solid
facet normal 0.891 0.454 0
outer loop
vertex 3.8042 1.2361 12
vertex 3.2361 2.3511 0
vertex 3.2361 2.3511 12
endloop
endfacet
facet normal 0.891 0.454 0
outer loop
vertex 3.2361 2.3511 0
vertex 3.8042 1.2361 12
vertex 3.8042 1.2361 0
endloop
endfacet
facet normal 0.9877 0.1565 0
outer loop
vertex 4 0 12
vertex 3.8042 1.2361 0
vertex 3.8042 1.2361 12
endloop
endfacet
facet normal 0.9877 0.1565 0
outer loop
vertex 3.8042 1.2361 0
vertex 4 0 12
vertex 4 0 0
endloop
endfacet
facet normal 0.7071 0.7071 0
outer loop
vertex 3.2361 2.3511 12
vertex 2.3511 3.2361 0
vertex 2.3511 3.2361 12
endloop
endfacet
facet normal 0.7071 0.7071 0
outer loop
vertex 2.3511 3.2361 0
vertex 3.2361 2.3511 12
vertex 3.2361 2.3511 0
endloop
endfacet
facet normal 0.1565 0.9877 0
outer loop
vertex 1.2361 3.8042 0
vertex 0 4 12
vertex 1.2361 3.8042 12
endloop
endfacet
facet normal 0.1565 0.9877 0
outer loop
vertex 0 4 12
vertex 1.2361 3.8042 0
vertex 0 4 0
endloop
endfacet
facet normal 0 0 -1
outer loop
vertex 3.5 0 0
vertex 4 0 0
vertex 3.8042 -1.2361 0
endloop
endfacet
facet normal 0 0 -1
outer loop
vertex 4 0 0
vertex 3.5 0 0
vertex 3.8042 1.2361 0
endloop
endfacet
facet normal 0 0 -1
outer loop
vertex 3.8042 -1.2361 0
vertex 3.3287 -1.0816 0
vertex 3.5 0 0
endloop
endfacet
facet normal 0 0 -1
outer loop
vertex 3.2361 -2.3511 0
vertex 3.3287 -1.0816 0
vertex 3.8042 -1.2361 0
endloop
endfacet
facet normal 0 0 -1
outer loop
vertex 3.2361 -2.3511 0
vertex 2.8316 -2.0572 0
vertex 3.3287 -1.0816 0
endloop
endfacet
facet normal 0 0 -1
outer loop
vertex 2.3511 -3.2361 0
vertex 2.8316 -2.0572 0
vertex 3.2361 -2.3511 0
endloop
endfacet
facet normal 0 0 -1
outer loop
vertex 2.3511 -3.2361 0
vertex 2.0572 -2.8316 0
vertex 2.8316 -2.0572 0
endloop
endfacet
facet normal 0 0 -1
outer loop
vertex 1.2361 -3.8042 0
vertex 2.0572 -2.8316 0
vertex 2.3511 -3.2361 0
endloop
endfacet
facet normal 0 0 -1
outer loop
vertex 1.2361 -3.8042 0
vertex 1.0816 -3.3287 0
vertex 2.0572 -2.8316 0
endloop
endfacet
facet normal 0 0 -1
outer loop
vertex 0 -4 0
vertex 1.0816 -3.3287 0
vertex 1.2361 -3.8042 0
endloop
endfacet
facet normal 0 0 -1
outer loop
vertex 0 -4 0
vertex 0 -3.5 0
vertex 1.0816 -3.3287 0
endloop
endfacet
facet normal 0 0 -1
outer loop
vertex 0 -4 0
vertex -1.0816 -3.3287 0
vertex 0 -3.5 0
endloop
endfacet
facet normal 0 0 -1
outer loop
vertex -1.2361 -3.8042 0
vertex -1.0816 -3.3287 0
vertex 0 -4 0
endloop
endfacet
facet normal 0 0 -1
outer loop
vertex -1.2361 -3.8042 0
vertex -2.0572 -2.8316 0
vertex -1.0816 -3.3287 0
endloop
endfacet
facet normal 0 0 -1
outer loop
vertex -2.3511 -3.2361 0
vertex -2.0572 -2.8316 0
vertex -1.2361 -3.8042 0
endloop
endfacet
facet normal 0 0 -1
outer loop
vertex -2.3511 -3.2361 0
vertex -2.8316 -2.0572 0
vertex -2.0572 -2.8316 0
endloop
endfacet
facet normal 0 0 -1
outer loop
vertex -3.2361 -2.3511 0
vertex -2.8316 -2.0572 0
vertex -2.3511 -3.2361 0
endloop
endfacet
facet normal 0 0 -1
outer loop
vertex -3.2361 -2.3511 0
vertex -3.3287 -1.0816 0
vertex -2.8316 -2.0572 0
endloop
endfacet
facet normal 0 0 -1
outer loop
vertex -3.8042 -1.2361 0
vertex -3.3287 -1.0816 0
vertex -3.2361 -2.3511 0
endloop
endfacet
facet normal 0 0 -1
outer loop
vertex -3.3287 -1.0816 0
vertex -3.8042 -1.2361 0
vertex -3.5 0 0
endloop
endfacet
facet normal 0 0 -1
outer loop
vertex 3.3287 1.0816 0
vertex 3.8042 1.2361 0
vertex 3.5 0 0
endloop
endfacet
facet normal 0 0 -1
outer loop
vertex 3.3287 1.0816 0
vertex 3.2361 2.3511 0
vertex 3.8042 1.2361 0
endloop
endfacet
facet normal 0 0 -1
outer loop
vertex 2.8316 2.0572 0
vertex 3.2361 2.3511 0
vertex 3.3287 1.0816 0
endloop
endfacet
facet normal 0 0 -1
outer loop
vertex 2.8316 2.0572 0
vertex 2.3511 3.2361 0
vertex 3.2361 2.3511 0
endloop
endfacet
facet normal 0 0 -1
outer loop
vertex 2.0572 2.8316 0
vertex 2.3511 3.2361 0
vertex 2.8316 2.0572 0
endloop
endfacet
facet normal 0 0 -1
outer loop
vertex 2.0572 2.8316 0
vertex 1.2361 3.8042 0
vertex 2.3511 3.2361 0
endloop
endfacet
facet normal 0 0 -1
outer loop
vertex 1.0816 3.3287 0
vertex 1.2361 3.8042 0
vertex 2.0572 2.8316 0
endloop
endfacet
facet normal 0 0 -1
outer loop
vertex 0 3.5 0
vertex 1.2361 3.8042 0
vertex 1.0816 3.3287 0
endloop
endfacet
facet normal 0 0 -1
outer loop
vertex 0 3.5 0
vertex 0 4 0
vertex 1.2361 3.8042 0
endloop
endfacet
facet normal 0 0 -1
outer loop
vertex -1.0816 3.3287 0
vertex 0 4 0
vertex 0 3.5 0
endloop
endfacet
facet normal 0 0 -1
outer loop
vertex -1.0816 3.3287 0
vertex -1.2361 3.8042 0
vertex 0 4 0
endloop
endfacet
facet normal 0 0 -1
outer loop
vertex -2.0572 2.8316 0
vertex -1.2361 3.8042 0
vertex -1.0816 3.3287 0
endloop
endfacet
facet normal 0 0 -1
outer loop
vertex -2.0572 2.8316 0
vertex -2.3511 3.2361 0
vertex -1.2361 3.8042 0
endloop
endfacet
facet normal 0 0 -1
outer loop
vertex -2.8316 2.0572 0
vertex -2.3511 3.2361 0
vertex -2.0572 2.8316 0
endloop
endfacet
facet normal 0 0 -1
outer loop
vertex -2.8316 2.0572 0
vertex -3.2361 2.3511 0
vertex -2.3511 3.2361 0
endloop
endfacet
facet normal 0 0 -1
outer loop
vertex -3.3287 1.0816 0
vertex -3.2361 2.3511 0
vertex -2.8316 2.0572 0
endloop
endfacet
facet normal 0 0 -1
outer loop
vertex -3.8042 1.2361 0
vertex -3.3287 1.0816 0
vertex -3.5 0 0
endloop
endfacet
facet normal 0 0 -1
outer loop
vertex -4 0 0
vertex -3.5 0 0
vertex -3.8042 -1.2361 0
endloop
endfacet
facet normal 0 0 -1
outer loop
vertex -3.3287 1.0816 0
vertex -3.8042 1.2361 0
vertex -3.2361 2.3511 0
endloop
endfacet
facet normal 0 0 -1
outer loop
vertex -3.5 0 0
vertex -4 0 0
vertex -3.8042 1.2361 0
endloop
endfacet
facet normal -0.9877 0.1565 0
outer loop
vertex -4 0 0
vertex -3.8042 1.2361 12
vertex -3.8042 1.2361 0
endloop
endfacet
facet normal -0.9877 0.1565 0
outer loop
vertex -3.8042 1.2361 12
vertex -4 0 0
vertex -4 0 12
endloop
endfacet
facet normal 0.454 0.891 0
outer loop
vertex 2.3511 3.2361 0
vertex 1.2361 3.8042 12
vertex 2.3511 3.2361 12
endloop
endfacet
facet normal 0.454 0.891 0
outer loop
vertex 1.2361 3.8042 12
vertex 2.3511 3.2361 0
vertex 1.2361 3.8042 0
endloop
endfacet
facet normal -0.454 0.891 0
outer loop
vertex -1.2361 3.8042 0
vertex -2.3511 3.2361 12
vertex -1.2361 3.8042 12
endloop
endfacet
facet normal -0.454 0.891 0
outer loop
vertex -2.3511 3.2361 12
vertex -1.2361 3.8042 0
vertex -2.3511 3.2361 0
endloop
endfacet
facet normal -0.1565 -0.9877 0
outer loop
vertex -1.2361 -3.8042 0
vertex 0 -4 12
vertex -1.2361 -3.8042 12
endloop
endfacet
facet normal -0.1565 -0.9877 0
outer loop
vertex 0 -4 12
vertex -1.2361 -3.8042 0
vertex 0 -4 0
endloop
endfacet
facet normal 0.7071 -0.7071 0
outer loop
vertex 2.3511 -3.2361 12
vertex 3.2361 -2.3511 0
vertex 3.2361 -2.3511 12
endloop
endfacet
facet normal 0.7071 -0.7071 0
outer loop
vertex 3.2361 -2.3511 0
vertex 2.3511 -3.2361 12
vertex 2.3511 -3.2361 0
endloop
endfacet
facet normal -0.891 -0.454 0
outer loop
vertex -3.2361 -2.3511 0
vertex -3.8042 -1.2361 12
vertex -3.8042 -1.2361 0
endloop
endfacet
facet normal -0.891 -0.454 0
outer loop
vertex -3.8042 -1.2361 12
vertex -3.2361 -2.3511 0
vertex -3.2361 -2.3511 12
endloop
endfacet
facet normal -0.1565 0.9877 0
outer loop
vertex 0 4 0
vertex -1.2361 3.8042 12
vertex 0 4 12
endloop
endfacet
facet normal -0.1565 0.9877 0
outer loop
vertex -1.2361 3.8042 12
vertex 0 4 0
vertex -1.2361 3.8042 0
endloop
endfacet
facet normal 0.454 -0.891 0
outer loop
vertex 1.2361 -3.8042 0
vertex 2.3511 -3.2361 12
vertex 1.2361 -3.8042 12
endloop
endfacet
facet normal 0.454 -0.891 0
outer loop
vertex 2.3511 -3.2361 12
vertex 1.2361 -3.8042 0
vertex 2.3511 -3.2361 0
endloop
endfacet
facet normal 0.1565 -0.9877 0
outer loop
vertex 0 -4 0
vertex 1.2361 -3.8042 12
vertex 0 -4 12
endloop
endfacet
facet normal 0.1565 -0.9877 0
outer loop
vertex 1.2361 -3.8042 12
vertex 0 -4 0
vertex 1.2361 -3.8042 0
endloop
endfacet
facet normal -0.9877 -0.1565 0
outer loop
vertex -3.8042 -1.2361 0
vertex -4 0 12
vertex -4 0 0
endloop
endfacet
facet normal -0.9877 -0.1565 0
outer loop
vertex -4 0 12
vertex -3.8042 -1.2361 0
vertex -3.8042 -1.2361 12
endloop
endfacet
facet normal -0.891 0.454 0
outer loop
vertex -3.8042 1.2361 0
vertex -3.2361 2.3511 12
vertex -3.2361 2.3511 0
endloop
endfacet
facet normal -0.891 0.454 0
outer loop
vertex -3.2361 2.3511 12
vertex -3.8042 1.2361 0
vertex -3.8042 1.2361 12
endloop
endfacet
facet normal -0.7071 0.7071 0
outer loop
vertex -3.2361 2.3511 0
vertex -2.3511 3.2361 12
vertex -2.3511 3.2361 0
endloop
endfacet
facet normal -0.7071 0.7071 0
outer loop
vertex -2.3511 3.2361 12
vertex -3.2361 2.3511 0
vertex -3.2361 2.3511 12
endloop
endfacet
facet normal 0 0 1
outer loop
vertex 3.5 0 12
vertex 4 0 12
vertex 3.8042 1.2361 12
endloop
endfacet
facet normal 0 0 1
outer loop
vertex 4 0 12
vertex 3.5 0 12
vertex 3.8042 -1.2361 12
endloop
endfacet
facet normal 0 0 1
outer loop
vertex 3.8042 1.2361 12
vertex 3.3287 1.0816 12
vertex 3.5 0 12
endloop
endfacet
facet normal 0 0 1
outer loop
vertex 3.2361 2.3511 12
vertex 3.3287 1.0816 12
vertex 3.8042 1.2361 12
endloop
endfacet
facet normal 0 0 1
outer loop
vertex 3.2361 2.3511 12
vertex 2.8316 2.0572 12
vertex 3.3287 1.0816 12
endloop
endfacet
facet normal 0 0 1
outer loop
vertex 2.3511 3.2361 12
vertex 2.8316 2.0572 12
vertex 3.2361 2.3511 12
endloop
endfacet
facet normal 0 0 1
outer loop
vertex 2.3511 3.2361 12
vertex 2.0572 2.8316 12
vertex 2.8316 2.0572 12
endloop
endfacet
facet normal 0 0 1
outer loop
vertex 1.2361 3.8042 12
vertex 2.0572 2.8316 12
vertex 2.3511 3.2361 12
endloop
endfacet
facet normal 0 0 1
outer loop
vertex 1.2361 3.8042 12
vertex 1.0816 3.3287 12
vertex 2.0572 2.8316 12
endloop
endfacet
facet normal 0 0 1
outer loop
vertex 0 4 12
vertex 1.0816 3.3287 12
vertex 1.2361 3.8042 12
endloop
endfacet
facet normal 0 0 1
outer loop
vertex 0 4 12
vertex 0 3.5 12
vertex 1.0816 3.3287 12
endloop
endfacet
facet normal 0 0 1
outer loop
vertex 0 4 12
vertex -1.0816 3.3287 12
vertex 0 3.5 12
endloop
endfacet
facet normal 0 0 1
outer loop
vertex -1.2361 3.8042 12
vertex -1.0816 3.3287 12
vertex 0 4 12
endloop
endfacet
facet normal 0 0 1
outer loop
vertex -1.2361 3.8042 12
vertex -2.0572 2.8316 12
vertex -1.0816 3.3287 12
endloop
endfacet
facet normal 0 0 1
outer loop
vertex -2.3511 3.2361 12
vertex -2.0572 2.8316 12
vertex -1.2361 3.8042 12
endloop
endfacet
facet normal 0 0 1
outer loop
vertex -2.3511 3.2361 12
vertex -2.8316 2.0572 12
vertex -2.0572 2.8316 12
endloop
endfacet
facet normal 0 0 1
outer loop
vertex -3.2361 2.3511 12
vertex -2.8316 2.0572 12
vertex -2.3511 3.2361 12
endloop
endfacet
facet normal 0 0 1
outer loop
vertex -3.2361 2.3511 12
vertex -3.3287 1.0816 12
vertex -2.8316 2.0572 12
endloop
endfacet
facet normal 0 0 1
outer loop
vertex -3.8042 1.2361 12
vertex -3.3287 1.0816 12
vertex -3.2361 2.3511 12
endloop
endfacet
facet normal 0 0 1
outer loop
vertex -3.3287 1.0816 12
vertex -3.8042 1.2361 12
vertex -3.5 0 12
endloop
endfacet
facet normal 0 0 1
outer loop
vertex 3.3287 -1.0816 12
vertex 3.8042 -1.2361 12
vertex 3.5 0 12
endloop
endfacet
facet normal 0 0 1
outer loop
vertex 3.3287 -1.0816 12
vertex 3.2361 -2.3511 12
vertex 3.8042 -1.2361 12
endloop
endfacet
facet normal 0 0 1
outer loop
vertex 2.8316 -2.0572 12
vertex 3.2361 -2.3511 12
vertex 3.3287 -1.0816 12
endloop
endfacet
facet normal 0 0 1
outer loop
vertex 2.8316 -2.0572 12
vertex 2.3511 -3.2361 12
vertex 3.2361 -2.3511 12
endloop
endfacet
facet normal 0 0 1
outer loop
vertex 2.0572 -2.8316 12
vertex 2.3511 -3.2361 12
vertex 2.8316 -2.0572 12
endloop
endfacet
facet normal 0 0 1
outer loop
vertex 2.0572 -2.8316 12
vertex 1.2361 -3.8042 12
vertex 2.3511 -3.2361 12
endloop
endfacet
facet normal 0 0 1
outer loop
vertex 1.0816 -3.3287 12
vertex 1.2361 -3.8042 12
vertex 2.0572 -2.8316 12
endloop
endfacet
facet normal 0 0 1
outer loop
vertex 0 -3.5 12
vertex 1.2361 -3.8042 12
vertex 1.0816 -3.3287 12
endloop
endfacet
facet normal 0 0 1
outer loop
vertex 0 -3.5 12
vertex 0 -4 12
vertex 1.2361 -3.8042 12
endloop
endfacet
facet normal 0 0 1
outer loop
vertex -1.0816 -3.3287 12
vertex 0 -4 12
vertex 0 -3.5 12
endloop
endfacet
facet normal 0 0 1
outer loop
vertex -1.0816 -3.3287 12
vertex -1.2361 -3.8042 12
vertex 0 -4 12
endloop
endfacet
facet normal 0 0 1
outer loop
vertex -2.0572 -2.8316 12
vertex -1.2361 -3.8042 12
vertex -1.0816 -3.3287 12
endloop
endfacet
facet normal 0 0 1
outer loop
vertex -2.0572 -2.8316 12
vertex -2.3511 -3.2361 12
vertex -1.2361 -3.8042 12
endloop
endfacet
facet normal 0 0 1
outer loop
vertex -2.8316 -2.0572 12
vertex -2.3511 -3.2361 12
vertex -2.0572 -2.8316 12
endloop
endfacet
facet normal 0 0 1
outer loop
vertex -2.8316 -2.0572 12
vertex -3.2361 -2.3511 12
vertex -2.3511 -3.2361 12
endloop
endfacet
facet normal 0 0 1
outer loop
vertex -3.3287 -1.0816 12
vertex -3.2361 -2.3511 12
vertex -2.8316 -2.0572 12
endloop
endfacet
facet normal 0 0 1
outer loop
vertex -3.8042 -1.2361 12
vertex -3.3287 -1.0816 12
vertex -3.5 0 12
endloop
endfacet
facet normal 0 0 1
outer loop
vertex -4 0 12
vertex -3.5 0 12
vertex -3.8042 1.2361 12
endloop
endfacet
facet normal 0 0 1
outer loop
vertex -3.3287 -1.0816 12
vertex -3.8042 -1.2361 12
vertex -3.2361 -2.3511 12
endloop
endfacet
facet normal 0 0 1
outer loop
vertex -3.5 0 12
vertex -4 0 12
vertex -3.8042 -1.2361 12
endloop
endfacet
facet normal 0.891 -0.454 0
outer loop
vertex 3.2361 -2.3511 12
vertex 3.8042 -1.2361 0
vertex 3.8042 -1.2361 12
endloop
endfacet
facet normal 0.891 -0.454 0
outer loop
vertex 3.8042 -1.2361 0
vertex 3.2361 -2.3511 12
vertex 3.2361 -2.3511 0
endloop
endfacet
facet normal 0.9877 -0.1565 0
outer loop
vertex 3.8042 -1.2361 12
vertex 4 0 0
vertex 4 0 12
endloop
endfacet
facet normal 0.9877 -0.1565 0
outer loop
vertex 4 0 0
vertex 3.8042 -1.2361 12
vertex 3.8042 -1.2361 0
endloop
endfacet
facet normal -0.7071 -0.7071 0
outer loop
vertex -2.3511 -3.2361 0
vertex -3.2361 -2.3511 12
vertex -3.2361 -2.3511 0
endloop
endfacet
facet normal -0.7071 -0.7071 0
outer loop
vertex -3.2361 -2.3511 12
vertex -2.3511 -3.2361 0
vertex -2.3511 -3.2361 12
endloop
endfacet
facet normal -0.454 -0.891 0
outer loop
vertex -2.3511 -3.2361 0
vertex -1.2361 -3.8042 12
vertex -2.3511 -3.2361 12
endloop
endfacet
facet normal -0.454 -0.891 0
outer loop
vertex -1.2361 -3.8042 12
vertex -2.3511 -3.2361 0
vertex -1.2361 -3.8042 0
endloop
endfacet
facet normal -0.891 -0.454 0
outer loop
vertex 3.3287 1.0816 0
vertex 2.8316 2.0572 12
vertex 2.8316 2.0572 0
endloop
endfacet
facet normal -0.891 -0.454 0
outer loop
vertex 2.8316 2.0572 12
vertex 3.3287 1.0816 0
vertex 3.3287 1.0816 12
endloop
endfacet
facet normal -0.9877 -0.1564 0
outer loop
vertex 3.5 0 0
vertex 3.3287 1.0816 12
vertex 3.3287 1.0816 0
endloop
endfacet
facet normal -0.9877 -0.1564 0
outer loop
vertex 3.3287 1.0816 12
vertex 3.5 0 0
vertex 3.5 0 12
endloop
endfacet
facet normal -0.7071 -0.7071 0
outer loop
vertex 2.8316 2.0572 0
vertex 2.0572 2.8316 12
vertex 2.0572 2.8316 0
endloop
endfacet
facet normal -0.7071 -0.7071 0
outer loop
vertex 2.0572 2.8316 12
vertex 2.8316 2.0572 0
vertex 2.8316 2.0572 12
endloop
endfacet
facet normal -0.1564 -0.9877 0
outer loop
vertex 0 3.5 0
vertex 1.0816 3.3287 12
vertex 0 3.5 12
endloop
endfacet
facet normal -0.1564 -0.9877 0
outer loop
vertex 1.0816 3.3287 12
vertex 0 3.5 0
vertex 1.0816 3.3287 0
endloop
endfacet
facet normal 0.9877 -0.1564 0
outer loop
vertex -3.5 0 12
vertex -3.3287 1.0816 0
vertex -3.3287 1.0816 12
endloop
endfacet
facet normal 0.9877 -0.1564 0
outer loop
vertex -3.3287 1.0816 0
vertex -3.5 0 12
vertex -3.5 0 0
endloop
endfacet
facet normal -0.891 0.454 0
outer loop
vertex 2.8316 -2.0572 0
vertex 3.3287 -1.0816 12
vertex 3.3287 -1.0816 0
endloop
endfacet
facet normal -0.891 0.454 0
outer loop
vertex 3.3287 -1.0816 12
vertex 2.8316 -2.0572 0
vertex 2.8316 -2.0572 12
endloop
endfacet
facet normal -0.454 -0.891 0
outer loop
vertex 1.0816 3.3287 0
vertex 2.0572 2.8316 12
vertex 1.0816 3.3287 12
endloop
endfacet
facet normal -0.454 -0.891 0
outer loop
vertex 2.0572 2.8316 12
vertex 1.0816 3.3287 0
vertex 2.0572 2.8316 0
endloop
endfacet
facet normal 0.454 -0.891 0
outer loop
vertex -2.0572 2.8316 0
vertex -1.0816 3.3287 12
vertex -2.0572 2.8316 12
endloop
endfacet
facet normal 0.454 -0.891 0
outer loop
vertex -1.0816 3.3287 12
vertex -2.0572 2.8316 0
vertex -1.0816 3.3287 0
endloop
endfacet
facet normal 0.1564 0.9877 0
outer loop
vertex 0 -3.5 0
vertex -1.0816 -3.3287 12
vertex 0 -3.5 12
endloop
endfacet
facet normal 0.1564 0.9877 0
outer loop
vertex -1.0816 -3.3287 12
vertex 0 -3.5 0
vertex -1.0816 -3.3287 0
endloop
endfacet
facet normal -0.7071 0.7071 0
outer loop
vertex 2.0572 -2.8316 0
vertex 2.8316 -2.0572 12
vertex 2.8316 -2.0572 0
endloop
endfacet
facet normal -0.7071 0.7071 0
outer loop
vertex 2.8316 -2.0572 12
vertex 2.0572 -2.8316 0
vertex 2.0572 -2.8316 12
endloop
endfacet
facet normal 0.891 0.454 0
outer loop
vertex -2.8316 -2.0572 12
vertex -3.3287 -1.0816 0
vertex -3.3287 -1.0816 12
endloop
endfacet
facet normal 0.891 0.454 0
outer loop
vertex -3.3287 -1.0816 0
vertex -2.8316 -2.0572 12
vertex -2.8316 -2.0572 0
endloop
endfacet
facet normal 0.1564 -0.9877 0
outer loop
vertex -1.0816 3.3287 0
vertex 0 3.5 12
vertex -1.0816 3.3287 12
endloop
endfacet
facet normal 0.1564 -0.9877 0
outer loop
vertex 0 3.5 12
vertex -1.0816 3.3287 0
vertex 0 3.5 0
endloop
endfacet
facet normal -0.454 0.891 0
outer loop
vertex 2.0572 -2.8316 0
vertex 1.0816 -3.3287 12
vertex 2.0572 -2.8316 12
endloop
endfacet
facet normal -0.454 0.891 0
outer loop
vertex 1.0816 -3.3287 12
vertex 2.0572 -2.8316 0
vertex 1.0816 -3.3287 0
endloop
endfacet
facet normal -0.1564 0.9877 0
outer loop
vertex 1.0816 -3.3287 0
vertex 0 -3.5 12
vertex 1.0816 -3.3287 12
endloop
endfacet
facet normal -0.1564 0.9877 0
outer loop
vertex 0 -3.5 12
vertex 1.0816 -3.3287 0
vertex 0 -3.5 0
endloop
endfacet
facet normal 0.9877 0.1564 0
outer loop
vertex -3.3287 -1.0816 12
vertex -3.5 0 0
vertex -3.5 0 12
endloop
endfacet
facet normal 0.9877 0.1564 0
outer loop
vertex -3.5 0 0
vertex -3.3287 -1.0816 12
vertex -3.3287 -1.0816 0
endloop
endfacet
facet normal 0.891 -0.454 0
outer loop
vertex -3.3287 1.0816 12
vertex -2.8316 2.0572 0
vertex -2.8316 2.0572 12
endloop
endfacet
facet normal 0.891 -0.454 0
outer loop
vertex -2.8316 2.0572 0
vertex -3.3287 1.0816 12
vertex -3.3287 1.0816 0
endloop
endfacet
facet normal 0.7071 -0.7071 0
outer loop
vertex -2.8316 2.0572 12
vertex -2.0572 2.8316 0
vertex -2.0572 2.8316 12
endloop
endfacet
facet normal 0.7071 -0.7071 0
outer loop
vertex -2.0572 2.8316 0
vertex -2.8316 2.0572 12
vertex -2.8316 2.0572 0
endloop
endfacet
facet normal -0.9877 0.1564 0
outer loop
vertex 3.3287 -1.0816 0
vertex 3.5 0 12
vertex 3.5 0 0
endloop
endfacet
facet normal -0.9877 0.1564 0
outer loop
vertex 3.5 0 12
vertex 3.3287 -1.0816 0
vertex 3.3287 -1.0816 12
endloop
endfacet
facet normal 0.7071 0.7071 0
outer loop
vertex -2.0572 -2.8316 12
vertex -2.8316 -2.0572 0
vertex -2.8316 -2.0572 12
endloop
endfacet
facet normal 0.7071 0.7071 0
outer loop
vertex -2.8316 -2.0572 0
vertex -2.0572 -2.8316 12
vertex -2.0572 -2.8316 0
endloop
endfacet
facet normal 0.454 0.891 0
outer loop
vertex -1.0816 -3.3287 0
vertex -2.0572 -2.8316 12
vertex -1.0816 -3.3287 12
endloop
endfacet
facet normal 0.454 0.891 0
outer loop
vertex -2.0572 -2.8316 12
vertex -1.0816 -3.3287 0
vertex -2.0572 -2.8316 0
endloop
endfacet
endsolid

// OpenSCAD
module spacer(h, d, fn){
    difference(){
      cylinder (h = h, d=d, $fn=fn);
      cylinder (h = h, d=d-1, $fn=fn);
    }
}

spacer(12, 8, 20);
